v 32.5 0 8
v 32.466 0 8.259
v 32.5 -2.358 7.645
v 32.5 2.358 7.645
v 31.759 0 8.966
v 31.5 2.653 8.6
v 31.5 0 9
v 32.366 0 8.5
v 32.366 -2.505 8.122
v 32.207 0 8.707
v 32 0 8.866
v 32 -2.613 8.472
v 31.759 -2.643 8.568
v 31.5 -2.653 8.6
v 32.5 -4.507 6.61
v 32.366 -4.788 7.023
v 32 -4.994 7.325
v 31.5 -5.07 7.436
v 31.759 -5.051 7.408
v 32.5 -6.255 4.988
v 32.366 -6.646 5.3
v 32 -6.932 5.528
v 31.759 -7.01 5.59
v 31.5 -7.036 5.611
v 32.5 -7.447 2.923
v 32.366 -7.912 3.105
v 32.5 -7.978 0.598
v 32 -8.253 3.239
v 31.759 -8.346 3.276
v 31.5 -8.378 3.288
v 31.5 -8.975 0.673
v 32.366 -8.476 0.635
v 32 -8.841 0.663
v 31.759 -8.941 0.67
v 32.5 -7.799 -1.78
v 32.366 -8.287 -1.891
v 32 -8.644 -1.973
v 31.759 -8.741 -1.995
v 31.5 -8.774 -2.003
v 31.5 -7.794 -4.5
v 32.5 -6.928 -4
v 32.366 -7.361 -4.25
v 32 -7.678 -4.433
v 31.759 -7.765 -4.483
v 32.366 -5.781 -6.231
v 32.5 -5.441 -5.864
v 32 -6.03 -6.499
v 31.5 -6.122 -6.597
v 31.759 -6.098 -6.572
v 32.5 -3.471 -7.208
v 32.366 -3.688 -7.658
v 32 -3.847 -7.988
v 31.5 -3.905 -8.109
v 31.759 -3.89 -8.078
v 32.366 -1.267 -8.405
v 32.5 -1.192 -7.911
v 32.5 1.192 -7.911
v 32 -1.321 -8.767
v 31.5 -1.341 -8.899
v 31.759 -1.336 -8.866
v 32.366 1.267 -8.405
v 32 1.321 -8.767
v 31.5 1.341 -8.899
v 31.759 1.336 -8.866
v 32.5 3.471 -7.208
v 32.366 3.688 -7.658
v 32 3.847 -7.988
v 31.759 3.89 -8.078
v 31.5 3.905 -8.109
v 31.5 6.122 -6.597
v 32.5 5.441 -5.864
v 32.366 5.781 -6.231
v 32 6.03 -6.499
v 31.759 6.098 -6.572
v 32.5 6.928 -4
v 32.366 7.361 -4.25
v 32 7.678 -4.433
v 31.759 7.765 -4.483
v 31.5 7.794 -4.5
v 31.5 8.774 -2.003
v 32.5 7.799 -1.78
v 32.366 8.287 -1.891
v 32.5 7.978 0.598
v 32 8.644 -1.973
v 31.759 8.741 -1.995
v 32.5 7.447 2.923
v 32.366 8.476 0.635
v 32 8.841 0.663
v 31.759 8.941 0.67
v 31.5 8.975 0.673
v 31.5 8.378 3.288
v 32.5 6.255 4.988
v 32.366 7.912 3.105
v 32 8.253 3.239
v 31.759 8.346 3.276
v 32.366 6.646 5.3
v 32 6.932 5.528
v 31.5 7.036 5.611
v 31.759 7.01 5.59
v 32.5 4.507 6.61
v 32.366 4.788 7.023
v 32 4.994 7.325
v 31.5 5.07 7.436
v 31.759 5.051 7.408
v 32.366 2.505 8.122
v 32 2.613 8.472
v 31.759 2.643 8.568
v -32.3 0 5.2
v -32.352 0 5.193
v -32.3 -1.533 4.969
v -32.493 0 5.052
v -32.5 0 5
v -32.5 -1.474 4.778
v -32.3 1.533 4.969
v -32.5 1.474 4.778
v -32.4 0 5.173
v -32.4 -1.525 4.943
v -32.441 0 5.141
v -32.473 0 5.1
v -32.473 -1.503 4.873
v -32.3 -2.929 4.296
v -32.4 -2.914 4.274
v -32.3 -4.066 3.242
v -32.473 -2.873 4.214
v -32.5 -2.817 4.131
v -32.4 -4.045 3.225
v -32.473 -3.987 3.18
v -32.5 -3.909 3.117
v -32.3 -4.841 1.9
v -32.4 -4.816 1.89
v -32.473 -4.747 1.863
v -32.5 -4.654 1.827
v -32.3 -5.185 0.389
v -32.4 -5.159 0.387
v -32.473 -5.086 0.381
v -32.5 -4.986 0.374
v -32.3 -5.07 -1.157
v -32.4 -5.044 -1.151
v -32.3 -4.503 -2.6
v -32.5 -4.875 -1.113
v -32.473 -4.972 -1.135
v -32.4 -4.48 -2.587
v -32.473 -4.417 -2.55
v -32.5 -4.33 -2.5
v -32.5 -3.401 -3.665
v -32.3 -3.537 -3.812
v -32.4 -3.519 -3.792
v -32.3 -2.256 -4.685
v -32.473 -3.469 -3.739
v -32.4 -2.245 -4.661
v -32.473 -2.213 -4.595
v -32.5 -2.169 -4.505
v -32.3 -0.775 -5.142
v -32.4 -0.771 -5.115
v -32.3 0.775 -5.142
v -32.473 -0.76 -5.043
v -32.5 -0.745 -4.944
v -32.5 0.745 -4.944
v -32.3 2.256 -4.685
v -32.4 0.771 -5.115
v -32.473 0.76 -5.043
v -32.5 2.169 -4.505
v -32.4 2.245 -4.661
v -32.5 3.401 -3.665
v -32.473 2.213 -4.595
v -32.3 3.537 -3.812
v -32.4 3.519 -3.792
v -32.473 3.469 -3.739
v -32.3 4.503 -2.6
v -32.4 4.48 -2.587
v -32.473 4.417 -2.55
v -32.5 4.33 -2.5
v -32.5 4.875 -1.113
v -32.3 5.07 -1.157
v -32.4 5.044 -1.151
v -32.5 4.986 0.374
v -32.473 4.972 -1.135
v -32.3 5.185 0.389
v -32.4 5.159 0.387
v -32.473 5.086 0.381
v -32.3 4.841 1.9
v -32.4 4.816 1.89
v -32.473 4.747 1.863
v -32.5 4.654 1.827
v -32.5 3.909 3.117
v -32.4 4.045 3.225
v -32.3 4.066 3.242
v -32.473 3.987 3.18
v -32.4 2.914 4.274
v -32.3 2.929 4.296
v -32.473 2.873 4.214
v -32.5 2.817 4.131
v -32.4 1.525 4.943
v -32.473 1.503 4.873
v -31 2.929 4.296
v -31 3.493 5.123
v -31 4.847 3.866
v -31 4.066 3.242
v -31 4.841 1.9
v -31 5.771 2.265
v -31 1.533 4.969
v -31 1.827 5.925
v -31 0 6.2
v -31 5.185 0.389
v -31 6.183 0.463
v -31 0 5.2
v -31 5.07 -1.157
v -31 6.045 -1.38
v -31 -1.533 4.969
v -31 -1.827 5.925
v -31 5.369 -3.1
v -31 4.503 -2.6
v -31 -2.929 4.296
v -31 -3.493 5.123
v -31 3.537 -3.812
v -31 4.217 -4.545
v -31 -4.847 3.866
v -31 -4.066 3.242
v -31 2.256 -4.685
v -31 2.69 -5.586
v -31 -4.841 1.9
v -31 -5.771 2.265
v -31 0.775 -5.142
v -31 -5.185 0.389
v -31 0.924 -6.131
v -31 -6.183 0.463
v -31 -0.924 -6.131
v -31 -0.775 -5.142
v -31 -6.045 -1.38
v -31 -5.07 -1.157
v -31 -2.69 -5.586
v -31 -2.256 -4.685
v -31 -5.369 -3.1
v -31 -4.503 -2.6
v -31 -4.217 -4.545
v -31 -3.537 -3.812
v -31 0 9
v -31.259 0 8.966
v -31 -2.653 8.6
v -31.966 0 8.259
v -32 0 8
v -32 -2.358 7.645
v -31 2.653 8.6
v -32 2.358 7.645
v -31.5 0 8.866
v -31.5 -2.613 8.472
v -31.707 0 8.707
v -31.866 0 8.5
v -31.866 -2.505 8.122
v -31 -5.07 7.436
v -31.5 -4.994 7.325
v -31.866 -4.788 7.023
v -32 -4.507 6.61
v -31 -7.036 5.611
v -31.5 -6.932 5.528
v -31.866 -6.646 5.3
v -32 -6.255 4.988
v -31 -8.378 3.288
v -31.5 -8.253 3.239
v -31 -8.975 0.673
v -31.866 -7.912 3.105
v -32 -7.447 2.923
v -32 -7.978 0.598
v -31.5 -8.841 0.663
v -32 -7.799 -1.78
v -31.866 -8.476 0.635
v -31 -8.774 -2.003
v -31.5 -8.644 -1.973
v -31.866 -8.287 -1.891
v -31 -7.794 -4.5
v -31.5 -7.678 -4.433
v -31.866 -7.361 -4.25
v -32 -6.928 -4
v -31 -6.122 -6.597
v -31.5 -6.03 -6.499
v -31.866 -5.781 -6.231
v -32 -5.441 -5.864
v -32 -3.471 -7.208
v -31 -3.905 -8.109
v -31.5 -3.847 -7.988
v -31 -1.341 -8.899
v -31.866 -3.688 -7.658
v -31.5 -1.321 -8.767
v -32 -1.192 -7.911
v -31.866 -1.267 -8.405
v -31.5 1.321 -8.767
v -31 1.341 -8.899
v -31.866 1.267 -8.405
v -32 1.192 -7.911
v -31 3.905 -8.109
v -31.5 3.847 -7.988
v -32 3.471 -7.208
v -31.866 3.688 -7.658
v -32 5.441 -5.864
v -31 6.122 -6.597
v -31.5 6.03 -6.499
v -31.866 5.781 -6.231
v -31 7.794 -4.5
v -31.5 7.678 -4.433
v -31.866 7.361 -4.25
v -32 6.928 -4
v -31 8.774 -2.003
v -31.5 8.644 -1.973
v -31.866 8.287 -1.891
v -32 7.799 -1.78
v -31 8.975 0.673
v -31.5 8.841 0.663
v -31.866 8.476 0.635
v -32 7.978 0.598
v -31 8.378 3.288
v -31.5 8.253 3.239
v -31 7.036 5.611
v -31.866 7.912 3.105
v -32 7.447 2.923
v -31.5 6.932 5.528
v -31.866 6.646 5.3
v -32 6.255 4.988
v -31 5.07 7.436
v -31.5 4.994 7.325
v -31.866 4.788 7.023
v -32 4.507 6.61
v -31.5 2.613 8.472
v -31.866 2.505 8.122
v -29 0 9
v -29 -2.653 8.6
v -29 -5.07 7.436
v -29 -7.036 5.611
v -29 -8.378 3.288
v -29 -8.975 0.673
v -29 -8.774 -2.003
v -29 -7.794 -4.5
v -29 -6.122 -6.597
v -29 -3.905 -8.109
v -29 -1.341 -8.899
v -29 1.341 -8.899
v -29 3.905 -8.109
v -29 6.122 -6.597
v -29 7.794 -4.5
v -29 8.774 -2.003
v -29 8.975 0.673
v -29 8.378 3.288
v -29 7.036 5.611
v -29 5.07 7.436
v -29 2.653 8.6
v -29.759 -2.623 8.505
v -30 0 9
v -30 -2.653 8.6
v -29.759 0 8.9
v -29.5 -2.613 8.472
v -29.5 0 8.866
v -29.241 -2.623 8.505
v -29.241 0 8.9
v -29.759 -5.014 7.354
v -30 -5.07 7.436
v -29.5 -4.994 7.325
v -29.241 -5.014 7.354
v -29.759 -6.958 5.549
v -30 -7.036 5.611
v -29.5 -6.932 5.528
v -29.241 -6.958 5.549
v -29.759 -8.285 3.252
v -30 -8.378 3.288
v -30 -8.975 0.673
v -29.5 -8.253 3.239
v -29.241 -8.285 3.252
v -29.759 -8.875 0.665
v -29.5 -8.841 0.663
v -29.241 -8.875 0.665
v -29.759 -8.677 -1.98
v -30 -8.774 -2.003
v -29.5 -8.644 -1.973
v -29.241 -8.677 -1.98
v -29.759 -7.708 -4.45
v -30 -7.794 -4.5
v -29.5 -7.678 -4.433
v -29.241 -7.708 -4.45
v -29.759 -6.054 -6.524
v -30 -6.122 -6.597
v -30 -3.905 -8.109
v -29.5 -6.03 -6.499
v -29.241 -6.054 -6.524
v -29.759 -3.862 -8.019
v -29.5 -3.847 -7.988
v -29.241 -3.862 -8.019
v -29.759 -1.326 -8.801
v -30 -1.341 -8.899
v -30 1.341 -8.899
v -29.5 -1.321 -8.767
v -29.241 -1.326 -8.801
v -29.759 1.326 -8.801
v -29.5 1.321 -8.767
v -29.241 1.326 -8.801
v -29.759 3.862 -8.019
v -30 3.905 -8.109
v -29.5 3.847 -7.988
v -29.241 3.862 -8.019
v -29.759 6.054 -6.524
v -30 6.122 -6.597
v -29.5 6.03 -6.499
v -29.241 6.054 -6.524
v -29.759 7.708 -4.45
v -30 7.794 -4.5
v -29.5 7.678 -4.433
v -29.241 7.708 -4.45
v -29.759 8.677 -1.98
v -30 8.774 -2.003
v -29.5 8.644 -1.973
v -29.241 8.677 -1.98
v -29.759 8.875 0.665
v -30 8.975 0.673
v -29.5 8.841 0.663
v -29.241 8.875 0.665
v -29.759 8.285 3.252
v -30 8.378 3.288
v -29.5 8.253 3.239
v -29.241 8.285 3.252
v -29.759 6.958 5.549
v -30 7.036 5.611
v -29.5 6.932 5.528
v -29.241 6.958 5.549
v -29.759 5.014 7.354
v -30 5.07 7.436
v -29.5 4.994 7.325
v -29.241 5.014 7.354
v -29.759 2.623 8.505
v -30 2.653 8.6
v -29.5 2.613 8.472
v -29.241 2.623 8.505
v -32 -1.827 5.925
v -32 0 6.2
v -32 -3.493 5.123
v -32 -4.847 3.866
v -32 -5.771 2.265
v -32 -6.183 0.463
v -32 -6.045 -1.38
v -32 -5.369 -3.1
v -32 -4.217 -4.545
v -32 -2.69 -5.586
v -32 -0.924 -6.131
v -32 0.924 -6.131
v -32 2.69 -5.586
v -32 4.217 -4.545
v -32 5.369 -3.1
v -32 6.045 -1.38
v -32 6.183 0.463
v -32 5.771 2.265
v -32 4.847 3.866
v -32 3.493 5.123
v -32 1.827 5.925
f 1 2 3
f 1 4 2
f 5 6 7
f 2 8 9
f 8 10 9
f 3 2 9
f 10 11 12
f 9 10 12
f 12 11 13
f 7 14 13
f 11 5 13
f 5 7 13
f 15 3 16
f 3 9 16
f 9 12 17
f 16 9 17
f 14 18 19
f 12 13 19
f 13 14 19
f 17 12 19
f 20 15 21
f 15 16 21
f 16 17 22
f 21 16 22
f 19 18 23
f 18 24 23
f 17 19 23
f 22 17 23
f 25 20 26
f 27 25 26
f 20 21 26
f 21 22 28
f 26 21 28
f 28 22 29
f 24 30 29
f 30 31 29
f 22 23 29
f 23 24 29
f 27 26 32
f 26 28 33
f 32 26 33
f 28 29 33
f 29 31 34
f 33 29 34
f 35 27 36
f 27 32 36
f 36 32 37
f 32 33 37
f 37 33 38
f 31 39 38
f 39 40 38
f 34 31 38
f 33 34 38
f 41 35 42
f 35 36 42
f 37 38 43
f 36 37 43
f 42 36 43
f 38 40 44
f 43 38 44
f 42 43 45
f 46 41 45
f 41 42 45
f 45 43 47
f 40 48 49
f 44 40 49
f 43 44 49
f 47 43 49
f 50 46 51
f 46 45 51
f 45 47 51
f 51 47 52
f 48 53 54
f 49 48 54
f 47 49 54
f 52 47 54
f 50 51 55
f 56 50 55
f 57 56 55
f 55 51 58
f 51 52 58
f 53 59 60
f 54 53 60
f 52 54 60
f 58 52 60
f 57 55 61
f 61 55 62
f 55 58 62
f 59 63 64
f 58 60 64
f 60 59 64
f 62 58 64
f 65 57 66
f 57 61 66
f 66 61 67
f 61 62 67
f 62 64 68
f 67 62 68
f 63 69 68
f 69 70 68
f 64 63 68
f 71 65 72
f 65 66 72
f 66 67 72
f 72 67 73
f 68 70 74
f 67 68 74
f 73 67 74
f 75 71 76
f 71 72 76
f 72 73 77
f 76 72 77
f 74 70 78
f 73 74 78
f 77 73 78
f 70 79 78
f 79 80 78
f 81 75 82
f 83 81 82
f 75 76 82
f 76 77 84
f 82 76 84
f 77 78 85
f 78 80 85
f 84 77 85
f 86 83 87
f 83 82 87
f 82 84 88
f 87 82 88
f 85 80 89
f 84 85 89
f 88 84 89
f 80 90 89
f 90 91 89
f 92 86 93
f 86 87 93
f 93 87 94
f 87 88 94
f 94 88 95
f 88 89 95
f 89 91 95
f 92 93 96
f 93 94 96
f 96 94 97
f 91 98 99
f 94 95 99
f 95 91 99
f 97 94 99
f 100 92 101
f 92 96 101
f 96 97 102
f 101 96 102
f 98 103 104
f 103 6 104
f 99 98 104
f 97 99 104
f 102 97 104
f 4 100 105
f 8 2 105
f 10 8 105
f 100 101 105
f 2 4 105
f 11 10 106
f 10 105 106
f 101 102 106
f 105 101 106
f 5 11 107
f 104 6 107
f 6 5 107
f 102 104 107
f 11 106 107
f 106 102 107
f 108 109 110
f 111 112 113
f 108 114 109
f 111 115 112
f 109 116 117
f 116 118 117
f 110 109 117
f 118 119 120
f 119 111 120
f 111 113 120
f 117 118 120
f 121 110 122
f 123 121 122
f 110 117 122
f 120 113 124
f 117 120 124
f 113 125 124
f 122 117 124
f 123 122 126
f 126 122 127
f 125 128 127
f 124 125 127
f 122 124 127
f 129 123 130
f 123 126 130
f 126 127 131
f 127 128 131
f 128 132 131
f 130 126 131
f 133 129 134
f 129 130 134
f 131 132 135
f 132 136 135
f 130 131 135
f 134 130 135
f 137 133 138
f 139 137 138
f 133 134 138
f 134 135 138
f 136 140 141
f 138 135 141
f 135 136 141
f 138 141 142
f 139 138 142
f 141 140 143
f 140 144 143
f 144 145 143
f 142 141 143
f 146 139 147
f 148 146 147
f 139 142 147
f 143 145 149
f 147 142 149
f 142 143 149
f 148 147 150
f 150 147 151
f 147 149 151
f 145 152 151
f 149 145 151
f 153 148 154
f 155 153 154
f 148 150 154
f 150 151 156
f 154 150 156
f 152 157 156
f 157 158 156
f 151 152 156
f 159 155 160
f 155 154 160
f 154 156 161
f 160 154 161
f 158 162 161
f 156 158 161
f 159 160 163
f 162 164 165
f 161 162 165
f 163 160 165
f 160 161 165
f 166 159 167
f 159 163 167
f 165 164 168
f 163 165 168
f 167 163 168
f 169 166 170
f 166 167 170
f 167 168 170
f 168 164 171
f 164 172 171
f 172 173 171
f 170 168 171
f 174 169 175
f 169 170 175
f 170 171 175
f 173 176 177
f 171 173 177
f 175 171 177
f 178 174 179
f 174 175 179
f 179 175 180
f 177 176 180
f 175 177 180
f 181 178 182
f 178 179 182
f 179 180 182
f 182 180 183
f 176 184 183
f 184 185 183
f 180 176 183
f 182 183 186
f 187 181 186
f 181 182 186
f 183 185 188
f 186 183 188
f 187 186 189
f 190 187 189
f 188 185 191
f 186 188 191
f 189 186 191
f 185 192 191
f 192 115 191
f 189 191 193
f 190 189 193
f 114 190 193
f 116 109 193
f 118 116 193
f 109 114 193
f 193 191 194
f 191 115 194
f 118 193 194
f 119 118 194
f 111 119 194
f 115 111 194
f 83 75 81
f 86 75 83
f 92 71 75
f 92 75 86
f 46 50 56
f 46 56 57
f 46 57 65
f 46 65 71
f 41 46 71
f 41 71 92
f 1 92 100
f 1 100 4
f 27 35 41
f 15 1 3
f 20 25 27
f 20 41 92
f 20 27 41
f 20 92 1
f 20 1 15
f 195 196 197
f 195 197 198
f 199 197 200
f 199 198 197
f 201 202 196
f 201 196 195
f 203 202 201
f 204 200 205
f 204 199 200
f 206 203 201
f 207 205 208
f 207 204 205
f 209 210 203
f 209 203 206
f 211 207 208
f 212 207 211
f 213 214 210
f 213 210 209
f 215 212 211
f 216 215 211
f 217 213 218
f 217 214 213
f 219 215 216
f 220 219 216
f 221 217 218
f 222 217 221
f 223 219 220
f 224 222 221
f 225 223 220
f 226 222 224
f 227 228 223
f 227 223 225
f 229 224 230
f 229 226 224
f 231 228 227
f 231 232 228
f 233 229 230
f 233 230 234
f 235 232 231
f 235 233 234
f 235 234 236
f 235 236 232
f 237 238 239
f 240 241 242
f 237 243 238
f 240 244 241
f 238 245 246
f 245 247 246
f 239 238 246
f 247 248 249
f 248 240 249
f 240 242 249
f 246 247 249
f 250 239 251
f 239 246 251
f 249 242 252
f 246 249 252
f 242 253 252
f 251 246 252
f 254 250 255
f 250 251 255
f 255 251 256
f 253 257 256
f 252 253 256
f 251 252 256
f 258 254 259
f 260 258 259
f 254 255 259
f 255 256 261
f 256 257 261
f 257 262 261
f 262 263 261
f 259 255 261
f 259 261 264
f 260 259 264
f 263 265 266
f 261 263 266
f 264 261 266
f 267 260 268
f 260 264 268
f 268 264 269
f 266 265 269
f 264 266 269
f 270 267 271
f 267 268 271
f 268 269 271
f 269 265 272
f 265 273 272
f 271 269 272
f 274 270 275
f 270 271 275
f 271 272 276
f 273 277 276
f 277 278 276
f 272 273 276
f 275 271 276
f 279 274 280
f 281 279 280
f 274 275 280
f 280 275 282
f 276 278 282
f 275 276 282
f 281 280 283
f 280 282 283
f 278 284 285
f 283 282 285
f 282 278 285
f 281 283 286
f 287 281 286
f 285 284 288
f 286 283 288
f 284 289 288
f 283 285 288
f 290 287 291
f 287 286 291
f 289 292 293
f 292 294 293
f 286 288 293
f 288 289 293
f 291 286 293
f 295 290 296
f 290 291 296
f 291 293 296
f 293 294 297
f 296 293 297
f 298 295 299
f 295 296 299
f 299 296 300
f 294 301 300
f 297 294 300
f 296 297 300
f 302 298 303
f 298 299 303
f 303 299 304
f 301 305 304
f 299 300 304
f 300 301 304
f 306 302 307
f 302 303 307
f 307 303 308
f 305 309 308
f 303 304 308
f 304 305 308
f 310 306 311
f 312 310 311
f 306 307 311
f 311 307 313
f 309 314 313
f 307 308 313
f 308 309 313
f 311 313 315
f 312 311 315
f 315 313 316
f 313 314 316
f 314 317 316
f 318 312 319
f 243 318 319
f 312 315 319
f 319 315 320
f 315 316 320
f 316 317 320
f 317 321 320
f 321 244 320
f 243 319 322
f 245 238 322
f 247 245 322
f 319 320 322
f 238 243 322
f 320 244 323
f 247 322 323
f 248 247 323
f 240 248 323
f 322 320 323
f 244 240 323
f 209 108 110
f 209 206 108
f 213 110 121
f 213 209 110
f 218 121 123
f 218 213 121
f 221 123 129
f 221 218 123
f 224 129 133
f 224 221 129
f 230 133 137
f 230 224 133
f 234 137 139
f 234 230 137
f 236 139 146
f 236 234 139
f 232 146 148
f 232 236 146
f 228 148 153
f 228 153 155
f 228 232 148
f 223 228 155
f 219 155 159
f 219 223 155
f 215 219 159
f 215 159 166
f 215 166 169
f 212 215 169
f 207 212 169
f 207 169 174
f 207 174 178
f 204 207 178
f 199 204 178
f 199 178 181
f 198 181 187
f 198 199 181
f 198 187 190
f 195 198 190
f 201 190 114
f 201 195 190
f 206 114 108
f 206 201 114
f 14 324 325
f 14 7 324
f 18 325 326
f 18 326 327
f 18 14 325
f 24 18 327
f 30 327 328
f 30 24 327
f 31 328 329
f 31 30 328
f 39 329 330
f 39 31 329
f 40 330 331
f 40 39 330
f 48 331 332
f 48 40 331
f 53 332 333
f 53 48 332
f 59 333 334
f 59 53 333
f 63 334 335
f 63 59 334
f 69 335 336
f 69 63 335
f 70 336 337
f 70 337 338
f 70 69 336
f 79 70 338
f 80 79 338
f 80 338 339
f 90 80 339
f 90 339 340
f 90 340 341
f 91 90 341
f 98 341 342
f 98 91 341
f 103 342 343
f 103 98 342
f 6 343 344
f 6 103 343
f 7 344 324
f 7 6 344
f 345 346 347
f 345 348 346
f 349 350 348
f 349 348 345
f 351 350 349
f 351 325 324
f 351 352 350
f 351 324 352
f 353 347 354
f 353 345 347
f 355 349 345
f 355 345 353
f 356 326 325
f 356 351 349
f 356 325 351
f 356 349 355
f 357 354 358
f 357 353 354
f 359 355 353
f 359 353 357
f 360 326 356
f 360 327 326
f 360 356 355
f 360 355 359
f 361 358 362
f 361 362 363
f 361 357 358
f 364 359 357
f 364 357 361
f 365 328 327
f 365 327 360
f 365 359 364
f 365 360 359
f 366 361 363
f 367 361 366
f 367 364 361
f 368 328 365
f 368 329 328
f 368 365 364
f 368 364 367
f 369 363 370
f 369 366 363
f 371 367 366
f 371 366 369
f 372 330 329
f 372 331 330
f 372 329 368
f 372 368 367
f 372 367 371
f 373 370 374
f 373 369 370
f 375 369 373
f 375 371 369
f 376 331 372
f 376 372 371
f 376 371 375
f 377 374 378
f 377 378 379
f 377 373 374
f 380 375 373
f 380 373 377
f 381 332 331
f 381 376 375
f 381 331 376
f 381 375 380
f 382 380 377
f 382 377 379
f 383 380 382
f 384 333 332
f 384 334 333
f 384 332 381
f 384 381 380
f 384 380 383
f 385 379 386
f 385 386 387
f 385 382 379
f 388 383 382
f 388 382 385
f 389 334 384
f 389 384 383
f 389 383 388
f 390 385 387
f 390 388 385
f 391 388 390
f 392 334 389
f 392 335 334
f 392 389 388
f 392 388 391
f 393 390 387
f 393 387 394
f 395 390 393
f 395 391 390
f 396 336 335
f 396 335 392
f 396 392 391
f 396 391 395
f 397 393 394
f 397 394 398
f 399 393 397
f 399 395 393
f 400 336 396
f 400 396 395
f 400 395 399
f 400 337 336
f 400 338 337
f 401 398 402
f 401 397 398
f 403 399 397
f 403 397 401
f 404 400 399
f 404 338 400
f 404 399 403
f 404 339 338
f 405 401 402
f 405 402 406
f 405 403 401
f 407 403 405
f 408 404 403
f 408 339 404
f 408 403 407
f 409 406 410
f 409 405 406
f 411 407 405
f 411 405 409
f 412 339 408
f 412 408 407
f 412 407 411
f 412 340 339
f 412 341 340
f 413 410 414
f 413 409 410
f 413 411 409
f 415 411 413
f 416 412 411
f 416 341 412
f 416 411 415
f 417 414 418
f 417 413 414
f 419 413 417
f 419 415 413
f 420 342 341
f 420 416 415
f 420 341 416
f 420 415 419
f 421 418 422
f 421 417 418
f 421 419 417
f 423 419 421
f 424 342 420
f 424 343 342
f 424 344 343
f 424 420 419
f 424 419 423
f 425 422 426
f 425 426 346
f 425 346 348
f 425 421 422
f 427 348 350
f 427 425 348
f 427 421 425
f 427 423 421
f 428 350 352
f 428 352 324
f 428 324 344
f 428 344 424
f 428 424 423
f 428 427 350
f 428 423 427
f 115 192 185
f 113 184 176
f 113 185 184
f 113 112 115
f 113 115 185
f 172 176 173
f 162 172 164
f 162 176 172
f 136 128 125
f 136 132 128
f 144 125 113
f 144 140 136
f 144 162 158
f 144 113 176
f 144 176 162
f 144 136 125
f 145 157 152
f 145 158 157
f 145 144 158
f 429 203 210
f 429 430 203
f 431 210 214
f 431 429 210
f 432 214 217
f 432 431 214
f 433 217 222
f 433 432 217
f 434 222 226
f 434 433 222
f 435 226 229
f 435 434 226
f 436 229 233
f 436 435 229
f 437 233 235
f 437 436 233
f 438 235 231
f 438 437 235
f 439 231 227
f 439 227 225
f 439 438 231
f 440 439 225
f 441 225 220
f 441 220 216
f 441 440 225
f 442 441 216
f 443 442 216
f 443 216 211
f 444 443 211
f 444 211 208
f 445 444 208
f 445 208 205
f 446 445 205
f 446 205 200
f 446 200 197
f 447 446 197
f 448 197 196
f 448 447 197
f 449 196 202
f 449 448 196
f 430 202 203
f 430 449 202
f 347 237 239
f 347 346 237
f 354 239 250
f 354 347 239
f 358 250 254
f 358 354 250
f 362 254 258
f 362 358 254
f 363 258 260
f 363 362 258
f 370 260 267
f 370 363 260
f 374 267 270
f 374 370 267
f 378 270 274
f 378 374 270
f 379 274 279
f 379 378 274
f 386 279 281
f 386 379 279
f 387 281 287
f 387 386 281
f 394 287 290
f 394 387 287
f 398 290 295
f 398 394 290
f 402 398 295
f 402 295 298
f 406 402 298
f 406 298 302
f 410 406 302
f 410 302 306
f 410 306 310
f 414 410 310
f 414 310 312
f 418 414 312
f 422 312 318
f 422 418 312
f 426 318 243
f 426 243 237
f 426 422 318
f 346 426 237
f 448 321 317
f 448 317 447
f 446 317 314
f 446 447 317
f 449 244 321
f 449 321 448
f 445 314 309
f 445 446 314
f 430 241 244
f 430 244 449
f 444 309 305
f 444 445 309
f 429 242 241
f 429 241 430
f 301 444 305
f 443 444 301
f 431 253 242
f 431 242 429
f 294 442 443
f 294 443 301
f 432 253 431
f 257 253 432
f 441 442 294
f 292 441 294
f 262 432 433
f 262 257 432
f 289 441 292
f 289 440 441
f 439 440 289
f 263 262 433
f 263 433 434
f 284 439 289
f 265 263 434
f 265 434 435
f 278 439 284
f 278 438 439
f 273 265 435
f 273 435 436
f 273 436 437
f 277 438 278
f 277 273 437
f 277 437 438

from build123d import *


with BuildPart() as part:
    # Sketch → Revolution (revolve)
    with BuildSketch(Plane.XZ):
        with BuildLine():
            Line((-32.5, 0), (-32.5, 5))
            ThreePointArc((-32.3, 5.2), (-32.441421, 5.141421), (-32.5, 5))
            Line((-32.3, 5.2), (-31, 5.2))
            Line((-31, 5.2), (-31, 6.2))
            Line((-31, 6.2), (-32, 6.2))
            Line((-32, 6.2), (-32, 8))
            ThreePointArc((-31, 9), (-31.707107, 8.707107), (-32, 8))
            Line((-31, 9), (-30, 9))
            ThreePointArc((-30, 9), (-29.5, 8.866025), (-29, 9))
            Line((-29, 9), (31.5, 9))
            ThreePointArc((32.5, 8), (32.207107, 8.707107), (31.5, 9))
            Line((32.5, 8), (32.5, 0))
            Line((32.5, 0), (-32.5, 0))
        make_face()
    revolve(axis=Axis((0, 0, 0), (1, 0, 0)))


solid = part.part
